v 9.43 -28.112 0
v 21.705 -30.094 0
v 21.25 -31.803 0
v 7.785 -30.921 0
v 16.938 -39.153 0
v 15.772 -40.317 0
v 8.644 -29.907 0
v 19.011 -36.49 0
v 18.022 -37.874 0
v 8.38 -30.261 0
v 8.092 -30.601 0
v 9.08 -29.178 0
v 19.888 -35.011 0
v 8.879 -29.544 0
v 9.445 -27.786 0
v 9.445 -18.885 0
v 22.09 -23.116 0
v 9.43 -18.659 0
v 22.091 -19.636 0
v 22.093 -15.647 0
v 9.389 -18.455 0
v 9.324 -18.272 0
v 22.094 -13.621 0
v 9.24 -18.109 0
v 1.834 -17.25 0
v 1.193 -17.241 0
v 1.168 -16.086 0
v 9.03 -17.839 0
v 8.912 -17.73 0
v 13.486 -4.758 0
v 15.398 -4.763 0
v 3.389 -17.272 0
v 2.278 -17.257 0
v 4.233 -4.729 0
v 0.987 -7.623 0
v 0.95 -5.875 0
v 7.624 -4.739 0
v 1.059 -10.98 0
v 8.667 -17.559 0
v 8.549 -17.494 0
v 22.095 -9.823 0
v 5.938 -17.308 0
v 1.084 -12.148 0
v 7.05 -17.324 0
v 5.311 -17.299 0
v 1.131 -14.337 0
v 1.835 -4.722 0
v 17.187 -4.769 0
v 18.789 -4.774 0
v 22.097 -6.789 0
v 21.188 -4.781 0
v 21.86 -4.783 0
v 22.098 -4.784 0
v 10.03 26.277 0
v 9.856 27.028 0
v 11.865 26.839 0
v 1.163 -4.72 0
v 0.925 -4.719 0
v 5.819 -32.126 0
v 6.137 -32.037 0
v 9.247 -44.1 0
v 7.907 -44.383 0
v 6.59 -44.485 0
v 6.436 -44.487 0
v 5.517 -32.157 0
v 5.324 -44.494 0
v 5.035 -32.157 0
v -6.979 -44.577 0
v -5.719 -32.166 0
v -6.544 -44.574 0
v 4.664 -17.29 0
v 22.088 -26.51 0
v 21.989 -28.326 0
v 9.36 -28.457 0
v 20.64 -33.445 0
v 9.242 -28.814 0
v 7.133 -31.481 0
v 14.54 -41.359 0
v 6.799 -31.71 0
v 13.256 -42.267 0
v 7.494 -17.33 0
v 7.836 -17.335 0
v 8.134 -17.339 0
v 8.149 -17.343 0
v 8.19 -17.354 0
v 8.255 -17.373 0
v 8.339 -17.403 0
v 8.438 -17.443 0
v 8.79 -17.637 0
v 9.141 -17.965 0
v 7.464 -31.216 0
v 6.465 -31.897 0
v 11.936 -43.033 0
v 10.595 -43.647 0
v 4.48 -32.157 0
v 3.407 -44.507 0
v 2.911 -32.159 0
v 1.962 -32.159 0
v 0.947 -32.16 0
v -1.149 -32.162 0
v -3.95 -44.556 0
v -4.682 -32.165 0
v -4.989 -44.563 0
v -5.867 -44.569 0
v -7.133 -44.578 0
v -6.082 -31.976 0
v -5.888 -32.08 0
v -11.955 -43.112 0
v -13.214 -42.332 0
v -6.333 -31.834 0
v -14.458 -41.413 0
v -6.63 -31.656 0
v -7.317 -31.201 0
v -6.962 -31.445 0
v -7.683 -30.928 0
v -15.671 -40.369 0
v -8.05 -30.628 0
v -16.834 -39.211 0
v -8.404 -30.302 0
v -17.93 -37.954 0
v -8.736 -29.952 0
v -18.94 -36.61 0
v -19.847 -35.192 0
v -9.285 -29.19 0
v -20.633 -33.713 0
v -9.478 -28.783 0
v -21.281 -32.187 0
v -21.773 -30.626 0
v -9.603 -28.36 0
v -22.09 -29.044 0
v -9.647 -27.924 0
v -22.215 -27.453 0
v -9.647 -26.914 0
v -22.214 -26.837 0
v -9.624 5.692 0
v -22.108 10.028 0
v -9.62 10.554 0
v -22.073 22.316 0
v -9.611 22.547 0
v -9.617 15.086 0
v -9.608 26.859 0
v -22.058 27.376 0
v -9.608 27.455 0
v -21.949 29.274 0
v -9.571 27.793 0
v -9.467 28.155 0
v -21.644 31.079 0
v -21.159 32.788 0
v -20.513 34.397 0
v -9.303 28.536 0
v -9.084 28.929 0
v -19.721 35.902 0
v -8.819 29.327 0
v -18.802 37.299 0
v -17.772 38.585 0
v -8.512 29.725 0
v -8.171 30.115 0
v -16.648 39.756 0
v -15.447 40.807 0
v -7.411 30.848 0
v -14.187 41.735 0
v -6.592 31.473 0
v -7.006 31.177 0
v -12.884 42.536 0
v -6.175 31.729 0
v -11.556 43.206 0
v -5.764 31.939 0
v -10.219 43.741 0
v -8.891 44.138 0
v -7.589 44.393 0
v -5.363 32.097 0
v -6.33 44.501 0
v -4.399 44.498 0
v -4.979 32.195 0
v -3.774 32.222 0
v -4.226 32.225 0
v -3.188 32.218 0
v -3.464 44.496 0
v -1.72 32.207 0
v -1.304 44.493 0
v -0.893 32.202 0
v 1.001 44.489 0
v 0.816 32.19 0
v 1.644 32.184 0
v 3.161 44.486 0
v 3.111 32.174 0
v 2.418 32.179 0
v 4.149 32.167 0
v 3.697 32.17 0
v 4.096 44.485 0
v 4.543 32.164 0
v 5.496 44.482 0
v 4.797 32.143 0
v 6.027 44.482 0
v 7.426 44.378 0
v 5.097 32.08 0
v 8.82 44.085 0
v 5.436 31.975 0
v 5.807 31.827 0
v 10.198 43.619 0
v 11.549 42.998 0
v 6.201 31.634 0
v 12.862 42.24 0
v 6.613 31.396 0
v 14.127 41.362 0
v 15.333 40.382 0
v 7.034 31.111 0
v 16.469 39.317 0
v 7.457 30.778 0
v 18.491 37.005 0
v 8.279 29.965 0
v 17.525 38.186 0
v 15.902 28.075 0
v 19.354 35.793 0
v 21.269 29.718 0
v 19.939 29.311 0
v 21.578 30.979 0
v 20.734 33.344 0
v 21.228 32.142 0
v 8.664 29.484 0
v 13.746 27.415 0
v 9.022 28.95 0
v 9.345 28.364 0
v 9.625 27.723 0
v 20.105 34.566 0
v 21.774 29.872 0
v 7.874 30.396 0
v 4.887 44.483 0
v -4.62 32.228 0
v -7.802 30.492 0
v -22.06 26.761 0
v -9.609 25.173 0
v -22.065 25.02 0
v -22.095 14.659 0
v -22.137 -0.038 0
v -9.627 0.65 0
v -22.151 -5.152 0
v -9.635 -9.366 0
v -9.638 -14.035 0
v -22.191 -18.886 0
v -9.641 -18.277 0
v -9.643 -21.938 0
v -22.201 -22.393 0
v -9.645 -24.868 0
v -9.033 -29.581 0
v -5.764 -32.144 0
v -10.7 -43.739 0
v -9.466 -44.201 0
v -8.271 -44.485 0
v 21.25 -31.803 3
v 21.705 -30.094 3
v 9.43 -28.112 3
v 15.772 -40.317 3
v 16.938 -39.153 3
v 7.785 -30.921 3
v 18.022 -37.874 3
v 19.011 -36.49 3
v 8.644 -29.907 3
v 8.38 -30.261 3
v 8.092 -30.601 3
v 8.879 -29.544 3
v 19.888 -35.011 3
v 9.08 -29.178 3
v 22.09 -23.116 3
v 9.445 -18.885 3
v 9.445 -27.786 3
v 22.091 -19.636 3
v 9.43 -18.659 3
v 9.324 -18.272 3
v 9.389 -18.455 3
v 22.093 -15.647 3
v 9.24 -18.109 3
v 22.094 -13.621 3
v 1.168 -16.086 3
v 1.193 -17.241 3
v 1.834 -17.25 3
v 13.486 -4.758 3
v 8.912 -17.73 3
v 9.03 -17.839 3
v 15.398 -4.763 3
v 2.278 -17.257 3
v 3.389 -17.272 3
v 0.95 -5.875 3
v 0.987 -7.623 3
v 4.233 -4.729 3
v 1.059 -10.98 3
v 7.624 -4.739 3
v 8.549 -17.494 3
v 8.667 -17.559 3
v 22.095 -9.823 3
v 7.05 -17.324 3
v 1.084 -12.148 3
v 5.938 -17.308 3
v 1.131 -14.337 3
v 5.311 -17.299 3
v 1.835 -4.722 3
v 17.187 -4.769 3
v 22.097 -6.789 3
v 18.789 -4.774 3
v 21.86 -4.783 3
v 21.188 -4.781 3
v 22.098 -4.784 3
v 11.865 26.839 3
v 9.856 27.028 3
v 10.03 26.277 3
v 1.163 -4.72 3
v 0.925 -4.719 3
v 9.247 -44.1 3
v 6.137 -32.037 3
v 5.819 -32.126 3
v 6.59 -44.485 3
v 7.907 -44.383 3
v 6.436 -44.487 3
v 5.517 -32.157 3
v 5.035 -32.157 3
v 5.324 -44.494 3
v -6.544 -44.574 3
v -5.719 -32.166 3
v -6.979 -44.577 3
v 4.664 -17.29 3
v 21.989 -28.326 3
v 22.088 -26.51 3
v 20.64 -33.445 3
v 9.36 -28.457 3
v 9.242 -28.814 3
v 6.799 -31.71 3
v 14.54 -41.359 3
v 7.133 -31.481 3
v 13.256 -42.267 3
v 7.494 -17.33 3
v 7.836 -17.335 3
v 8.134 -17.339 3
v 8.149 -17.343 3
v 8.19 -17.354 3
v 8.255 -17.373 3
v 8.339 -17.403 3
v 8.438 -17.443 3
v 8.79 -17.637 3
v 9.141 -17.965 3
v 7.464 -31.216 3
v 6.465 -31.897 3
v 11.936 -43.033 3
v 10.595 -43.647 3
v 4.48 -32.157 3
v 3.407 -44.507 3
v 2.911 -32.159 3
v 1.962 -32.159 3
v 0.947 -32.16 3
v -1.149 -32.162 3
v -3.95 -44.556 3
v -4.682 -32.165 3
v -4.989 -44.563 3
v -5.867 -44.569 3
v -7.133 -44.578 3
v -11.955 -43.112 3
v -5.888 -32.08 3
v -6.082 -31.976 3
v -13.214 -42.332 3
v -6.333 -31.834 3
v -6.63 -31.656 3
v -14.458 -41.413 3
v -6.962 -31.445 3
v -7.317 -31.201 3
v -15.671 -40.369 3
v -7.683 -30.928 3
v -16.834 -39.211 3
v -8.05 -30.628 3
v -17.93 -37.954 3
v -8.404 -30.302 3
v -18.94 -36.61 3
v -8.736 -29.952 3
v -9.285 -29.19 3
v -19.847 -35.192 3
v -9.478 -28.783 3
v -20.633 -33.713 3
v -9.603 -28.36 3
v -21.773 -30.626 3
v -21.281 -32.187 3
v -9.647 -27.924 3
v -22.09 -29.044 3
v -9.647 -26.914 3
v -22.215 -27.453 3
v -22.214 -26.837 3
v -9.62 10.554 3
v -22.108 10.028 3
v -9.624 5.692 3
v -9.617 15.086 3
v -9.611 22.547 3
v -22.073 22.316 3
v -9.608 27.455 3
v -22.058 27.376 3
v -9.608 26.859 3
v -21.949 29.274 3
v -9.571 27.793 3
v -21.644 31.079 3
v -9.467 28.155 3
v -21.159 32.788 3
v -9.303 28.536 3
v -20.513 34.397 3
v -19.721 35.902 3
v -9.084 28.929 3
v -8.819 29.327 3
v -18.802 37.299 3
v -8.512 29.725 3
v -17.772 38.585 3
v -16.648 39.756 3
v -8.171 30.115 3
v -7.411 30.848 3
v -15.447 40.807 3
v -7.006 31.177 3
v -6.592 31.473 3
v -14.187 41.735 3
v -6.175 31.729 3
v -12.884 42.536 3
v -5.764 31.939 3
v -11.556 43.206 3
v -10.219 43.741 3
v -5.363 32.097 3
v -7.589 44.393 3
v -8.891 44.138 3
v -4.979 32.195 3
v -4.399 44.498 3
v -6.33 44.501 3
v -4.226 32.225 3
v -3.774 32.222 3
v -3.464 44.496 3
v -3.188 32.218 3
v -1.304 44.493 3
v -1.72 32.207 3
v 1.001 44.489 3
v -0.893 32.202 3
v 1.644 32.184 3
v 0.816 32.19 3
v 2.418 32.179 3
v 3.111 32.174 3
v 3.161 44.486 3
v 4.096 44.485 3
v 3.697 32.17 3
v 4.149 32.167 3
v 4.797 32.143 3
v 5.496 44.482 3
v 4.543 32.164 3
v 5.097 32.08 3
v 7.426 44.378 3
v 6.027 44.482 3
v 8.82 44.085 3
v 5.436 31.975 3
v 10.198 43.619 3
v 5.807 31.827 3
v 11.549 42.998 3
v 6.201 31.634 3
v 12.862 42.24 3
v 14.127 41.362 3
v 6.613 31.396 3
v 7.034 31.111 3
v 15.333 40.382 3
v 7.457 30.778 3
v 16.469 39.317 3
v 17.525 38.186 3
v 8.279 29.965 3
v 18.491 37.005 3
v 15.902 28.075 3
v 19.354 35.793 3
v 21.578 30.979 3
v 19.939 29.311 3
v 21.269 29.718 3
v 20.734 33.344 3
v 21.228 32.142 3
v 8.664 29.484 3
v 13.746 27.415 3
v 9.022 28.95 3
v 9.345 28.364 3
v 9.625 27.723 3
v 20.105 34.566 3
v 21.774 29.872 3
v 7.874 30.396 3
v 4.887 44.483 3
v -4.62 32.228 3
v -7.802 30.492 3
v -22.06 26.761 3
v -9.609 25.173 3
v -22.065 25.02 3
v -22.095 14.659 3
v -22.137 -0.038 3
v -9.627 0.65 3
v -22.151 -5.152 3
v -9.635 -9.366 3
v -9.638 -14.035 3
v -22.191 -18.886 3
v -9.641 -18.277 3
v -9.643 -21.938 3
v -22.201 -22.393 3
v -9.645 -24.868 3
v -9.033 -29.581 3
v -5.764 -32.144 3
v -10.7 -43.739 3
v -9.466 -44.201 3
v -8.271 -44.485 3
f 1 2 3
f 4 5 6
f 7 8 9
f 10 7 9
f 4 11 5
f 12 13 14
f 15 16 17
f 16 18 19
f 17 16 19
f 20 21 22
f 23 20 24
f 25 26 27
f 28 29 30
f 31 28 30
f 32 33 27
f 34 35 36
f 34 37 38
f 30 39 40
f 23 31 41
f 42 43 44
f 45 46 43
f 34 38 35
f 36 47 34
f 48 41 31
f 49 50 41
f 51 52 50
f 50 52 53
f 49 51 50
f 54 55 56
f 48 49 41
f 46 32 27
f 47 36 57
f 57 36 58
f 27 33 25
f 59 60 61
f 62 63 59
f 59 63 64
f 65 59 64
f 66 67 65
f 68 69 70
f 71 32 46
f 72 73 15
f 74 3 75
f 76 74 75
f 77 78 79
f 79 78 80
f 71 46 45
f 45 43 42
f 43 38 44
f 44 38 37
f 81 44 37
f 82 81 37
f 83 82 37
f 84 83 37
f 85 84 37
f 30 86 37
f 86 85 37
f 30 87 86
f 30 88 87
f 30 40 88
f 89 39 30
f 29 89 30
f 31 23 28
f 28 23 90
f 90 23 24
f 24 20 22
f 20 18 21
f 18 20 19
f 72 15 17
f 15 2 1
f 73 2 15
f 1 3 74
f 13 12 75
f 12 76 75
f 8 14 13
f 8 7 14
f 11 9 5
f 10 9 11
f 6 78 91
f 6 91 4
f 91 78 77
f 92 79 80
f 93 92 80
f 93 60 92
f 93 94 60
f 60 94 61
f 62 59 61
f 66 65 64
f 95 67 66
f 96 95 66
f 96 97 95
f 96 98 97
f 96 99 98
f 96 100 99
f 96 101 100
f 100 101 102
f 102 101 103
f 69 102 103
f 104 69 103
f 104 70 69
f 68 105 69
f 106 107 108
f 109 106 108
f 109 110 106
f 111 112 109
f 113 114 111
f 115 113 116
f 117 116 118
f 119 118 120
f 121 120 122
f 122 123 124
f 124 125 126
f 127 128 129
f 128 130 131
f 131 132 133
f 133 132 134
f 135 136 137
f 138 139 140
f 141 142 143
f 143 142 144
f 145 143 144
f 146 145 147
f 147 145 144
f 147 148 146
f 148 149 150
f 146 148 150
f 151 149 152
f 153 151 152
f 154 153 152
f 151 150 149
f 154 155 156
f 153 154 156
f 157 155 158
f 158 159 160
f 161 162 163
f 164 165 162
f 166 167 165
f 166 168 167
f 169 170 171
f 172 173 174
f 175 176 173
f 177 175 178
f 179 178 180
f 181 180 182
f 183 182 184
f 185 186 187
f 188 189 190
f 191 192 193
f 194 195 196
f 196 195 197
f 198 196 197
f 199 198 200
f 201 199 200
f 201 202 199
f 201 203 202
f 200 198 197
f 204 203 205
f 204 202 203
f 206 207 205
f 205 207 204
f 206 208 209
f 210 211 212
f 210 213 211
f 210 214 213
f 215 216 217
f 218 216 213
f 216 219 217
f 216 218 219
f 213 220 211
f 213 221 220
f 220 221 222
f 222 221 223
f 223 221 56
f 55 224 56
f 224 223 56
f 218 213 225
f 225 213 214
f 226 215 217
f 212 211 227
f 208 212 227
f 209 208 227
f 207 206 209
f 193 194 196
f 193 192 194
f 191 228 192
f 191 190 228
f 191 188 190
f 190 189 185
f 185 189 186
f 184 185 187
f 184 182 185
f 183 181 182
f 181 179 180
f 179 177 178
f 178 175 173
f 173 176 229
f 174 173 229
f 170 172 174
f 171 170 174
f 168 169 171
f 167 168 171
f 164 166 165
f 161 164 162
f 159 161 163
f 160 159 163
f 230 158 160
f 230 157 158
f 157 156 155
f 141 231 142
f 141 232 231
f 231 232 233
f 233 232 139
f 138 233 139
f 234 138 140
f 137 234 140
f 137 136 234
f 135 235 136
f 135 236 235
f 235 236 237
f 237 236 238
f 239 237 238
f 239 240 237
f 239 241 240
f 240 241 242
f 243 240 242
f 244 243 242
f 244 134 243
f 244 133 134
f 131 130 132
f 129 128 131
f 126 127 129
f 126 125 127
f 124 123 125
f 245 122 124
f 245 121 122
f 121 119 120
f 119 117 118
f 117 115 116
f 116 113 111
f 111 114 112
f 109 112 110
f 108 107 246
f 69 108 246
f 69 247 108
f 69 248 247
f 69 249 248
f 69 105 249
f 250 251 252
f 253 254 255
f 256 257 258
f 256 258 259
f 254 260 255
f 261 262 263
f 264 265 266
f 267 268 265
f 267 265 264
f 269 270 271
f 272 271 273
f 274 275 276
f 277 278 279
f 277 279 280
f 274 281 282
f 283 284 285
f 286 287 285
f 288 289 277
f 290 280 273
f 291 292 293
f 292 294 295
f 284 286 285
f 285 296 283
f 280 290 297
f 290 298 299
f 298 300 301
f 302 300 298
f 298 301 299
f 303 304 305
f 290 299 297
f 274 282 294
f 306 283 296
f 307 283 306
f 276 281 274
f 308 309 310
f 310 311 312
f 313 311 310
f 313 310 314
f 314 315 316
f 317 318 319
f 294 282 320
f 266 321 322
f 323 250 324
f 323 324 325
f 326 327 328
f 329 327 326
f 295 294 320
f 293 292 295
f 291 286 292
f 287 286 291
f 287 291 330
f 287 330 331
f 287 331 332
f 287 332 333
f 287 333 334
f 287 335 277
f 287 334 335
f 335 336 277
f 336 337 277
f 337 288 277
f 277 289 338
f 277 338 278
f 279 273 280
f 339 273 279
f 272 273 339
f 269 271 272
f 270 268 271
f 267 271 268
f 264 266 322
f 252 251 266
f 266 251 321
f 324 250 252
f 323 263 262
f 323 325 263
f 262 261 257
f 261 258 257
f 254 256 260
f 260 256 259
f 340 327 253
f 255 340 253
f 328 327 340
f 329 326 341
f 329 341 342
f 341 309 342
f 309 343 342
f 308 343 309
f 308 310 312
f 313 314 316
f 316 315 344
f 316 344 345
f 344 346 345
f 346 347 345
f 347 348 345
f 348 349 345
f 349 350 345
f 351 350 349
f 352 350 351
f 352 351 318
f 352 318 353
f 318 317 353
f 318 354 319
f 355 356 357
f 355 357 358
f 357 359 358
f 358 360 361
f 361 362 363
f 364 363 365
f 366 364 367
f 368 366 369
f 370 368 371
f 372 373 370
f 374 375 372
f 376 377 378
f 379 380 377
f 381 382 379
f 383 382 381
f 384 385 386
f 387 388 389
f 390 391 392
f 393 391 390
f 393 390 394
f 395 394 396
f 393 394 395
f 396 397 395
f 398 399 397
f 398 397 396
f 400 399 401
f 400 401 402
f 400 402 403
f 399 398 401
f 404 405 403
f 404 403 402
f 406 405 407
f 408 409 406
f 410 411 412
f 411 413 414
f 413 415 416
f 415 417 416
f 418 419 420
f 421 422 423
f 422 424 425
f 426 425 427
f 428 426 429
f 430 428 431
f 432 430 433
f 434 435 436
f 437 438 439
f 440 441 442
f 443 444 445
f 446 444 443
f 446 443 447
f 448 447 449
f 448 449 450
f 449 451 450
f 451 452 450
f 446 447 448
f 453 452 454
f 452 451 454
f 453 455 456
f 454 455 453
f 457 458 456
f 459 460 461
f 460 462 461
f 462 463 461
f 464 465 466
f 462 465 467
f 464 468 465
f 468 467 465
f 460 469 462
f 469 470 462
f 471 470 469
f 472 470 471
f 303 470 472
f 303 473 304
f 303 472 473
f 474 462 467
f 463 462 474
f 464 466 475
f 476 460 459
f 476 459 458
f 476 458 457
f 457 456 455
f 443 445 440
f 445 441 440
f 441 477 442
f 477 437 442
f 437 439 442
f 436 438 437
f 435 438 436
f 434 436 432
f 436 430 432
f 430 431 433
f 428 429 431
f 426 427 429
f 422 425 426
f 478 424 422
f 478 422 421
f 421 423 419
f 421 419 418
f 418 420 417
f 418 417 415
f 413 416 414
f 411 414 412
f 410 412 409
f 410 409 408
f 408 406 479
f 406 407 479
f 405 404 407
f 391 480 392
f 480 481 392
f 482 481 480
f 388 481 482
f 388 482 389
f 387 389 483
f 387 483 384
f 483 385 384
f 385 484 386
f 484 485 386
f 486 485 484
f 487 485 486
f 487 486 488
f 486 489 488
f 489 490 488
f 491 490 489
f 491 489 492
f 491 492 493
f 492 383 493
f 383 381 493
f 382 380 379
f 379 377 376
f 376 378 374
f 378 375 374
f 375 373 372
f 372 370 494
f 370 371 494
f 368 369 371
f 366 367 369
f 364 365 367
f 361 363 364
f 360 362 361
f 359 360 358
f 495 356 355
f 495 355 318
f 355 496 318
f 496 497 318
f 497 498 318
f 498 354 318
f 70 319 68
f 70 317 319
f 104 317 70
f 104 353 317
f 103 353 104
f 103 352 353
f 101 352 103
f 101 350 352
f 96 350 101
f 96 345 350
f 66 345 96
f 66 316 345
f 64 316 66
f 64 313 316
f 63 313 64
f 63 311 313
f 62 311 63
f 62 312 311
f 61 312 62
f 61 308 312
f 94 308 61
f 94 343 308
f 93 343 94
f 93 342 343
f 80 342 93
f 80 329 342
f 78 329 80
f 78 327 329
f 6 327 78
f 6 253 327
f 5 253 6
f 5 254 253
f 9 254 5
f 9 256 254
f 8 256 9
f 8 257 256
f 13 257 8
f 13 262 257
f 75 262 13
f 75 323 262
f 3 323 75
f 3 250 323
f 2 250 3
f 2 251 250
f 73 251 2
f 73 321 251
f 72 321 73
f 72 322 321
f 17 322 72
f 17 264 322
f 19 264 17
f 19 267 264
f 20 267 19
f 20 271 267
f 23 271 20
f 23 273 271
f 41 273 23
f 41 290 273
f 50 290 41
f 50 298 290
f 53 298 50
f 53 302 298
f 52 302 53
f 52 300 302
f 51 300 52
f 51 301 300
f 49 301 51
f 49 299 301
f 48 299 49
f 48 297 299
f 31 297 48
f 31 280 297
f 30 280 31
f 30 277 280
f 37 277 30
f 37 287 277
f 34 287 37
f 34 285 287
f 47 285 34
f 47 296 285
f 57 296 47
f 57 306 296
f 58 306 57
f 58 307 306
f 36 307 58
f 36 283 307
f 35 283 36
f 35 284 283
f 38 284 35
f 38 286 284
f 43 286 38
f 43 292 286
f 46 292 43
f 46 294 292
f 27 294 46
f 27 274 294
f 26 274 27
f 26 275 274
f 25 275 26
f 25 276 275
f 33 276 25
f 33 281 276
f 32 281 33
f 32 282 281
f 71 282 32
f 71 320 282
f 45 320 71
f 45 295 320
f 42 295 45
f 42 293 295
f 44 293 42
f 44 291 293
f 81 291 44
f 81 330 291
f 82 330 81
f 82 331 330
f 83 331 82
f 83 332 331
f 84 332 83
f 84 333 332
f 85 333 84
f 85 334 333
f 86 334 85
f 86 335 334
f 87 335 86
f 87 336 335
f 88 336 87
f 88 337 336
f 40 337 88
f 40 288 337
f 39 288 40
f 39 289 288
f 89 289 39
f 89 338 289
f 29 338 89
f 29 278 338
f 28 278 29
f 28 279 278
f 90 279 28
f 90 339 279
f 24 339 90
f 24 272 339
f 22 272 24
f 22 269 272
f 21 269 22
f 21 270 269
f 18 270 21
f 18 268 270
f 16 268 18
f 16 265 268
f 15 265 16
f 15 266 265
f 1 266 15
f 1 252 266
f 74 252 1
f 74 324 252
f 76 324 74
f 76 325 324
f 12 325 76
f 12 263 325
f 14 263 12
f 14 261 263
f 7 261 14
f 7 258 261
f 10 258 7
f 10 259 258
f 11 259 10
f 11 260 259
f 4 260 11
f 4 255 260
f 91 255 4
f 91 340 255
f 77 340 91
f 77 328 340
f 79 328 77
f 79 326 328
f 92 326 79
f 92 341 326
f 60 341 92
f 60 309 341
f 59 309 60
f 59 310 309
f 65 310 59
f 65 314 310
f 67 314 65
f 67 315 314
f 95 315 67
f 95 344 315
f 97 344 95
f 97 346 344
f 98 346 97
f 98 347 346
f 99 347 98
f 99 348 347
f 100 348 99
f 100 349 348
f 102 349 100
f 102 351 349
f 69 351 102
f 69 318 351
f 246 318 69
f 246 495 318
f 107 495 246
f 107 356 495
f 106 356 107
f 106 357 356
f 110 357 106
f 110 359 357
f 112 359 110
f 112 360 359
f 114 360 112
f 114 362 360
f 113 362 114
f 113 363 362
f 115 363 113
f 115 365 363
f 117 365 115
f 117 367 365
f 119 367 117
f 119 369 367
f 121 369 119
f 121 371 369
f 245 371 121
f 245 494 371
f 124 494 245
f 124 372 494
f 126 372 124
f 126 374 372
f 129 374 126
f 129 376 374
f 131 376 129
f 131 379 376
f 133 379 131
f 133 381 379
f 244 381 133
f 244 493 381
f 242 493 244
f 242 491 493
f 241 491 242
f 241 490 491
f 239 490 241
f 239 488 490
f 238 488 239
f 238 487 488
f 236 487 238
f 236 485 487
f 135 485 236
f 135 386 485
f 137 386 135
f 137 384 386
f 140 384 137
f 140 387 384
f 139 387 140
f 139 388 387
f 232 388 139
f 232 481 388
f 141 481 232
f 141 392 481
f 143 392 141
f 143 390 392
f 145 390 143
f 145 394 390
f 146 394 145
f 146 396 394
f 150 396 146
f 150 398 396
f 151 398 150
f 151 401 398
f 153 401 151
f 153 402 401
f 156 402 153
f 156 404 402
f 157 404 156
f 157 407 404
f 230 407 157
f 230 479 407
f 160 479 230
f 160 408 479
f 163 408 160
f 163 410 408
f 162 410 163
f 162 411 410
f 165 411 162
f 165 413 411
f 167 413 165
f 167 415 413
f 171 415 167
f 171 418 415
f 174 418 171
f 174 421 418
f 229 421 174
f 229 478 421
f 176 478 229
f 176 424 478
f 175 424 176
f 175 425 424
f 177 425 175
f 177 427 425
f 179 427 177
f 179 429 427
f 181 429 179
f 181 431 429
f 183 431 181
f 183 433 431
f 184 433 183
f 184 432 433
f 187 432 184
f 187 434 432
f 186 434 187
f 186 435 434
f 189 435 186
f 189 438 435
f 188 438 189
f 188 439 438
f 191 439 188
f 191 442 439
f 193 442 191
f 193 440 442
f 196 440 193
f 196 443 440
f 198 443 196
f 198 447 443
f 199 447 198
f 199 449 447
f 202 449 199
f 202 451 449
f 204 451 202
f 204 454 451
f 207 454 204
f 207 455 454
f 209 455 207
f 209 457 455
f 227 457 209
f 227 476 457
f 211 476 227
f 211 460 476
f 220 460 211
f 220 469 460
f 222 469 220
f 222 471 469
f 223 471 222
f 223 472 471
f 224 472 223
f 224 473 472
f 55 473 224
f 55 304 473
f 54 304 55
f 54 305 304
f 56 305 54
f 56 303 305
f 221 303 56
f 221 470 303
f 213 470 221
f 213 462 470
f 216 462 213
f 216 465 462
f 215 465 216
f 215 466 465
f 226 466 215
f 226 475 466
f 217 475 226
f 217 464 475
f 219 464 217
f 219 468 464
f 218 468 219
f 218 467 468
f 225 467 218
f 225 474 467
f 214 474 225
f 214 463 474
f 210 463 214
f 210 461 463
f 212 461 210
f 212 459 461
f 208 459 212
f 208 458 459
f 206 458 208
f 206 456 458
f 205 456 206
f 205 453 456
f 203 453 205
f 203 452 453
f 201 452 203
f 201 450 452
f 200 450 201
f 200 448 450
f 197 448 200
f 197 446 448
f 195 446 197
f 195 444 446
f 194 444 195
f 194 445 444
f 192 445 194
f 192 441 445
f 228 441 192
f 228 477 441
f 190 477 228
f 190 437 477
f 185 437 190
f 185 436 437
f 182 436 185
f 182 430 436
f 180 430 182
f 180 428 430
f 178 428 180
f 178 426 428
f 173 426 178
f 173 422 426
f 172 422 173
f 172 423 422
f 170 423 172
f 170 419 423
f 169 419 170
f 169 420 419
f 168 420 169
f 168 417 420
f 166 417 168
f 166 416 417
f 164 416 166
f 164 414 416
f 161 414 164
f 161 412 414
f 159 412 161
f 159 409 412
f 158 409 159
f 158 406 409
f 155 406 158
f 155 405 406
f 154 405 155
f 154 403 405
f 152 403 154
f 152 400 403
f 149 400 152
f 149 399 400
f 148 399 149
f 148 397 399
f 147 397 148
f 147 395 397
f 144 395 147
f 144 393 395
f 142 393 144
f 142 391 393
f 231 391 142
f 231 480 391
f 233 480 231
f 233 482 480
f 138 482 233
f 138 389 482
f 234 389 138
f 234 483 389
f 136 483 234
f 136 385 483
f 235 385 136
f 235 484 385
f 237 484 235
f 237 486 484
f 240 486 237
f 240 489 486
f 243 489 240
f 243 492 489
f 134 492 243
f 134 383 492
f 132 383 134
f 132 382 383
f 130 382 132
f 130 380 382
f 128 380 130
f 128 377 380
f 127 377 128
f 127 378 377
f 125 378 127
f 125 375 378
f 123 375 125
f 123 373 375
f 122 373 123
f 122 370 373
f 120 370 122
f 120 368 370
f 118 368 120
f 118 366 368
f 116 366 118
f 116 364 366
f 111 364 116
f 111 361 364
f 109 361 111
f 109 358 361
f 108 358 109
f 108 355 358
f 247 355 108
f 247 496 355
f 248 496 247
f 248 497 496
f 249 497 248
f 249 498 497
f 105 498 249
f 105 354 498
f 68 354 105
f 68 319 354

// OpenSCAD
// Generated from 交通部公路局（原交通部公路總局）「新式號牌使用之英文字、數字字體」author trace
fudge = 0.1;

module glyph_2012_G(h = 3) {
  difference() {
    linear_extrude(height = h)
      polygon(points = [[-6.3296, 44.5007], [-7.5892, 44.3927], [-8.8915, 44.1383], [-10.2195, 43.7415], [-11.5561, 43.206], [-12.8844, 42.5359], [-14.1871, 41.7349], [-15.4473, 40.8068], [-16.6478, 39.7557], [-17.7717, 38.5852], [-18.8018, 37.2993], [-19.7211, 35.9019], [-20.5126, 34.3967], [-21.1591, 32.7878], [-21.6436, 31.0788], [-21.949, 29.2737], [-22.0583, 27.3763], [-22.0601, 26.7606], [-22.0651, 25.0204], [-22.0728, 22.3164], [-22.0829, 18.8092], [-22.0948, 14.6595], [-22.108, 10.0279], [-22.1222, 5.0751], [-22.1369, -0.0384], [-22.1515, -5.1519], [-22.1657, -10.1048], [-22.179, -14.7364], [-22.1909, -18.8861], [-22.2009, -22.3933], [-22.2087, -25.0973], [-22.2137, -26.8374], [-22.2154, -27.4532], [-22.09, -29.044], [-21.7726, -30.6263], [-21.2812, -32.1871], [-20.6334, -33.7134], [-19.847, -35.192], [-18.9398, -36.61], [-17.9296, -37.9541], [-16.8341, -39.2115], [-15.6712, -40.369], [-14.4585, -41.4135], [-13.2139, -42.3321], [-11.955, -43.1116], [-10.6998, -43.7389], [-9.466, -44.2011], [-8.2712, -44.485], [-7.1334, -44.5776], [-6.9793, -44.5766], [-6.5437, -44.5737], [-5.8669, -44.5691], [-4.9891, -44.5632], [-3.9504, -44.5563], [-2.7911, -44.5485], [-1.5514, -44.5402], [-0.2716, -44.5316], [1.0083, -44.523], [2.248, -44.5147], [3.4073, -44.5069], [4.446, -44.4999], [5.3238, -44.494], [6.0006, -44.4895], [6.4362, -44.4866], [6.5903, -44.4855], [7.9069, -44.3827], [9.2467, -44.1001], [10.5948, -43.647], [11.9362, -43.0329], [13.2562, -42.267], [14.5397, -41.3587], [15.7718, -40.3175], [16.9376, -39.1528], [18.0222, -37.8738], [19.0108, -36.4899], [19.8882, -35.0107], [20.6398, -33.4453], [21.2504, -31.8032], [21.7053, -30.0938], [21.9895, -28.3264], [22.0881, -26.5105], [22.0882, -26.2665], [22.0885, -25.577], [22.089, -24.5055], [22.0896, -23.1157], [22.0903, -21.4714], [22.0911, -19.6361], [22.092, -17.6735], [22.0929, -15.6473], [22.0937, -13.621], [22.0946, -11.6584], [22.0954, -9.8231], [22.0961, -8.1788], [22.0967, -6.7891], [22.0972, -5.7176], [22.0975, -5.028], [22.0976, -4.784], [21.8598, -4.7833], [21.1878, -4.7812], [20.1437, -4.778], [18.7894, -4.7739], [17.187, -4.7689], [15.3984, -4.7634], [13.4859, -4.7576], [11.5113, -4.7515], [9.5367, -4.7454], [7.6241, -4.7395], [5.8356, -4.734], [4.2332, -4.7291], [2.8789, -4.7249], [1.8347, -4.7217], [1.1627, -4.7197], [0.925, -4.7189], [0.928, -4.8596], [0.9365, -5.257], [0.9497, -5.8746], [0.9669, -6.6755], [0.9872, -7.6233], [1.0098, -8.6811], [1.034, -9.8122], [1.059, -10.9801], [1.0841, -12.148], [1.1083, -13.2791], [1.1309, -14.3369], [1.1512, -15.2847], [1.1684, -16.0857], [1.1816, -16.7032], [1.1901, -17.1006], [1.1931, -17.2413], [1.2711, -17.2424], [1.4914, -17.2455], [1.8337, -17.2503], [2.2777, -17.2566], [2.803, -17.264], [3.3893, -17.2723], [4.0163, -17.2811], [4.6637, -17.2902], [5.311, -17.2994], [5.938, -17.3082], [6.5243, -17.3165], [7.0496, -17.3239], [7.4936, -17.3301], [7.8359, -17.335], [8.0562, -17.3381], [8.1342, -17.3392], [8.1489, -17.3426], [8.1905, -17.3537], [8.2551, -17.3733], [8.339, -17.4026], [8.4382, -17.4427], [8.5489, -17.4944], [8.6674, -17.5589], [8.7896, -17.6373], [8.9119, -17.7304], [9.0303, -17.8395], [9.141, -17.9654], [9.2403, -18.1094], [9.3241, -18.2723], [9.3888, -18.4552], [9.4304, -18.6592], [9.4451, -18.8853], [9.4451, -18.9853], [9.4451, -19.2678], [9.4451, -19.7067], [9.4451, -20.2761], [9.4451, -20.9497], [9.4451, -21.7016], [9.4451, -22.5057], [9.4451, -23.3358], [9.4451, -24.1659], [9.4451, -24.97], [9.4451, -25.7219], [9.4451, -26.3956], [9.4451, -26.9649], [9.4451, -27.4039], [9.4451, -27.6864], [9.4451, -27.7863], [9.4297, -28.1124], [9.3604, -28.4567], [9.2422, -28.8137], [9.0802, -29.1781], [8.8792, -29.5445], [8.6442, -29.9075], [8.3802, -30.2615], [8.0921, -30.6013], [7.785, -30.9215], [7.4637, -31.2165], [7.1333, -31.481], [6.7986, -31.7096], [6.4648, -31.8969], [6.1367, -32.0375], [5.8192, -32.1259], [5.5175, -32.1567], [5.3913, -32.1568], [5.0346, -32.1571], [4.4805, -32.1575], [3.7617, -32.1581], [2.9112, -32.1588], [1.962, -32.1595], [0.947, -32.1604], [-0.101, -32.1612], [-1.149, -32.162], [-2.164, -32.1628], [-3.1132, -32.1636], [-3.9637, -32.1643], [-4.6825, -32.1649], [-5.2366, -32.1653], [-5.5933, -32.1656], [-5.7195, -32.1657], [-5.7636, -32.1439], [-5.8882, -32.0801], [-6.0819, -31.9762], [-6.3332, -31.8343], [-6.6304, -31.6565], [-6.9622, -31.4449], [-7.317, -31.2015], [-7.6833, -30.9285], [-8.0496, -30.6278], [-8.4044, -30.3016], [-8.7361, -29.9519], [-9.0334, -29.5808], [-9.2846, -29.1904], [-9.4783, -28.7827], [-9.603, -28.3599], [-9.6471, -27.9239], [-9.6466, -26.9136], [-9.6454, -24.8677], [-9.6435, -21.9381], [-9.6409, -18.2766], [-9.638, -14.0353], [-9.6347, -9.3659], [-9.6311, -4.4203], [-9.6274, 0.6496], [-9.6238, 5.6918], [-9.6202, 10.5545], [-9.6169, 15.0859], [-9.6139, 19.1339], [-9.6114, 22.5468], [-9.6095, 25.1726], [-9.6082, 26.8595], [-9.6078, 27.4555], [-9.5709, 27.7929], [-9.467, 28.1552], [-9.3027, 28.5361], [-9.0845, 28.929], [-8.8189, 29.3275], [-8.5122, 29.7251], [-8.1711, 30.1153], [-7.802, 30.4917], [-7.4114, 30.8478], [-7.0057, 31.1771], [-6.5916, 31.4731], [-6.1753, 31.7294], [-5.7636, 31.9394], [-5.3627, 32.0968], [-4.9793, 32.195], [-4.6197, 32.2276], [-4.5168, 32.2269], [-4.226, 32.2249], [-3.7741, 32.2217], [-3.188, 32.2177], [-2.4946, 32.2129], [-1.7205, 32.2075], [-0.8928, 32.2017], [-0.0383, 32.1958], [0.8162, 32.1899], [1.6439, 32.1841], [2.418, 32.1788], [3.1114, 32.1739], [3.6975, 32.1699], [4.1494, 32.1667], [4.4402, 32.1647], [4.5431, 32.164], [4.797, 32.1429], [5.0971, 32.0804], [5.4361, 31.9755], [5.8067, 31.827], [6.2014, 31.6341], [6.6129, 31.3956], [7.0338, 31.1106], [7.4568, 30.7779], [7.8745, 30.3965], [8.2795, 29.9655], [8.6644, 29.4837], [9.0219, 28.9501], [9.3446, 28.3637], [9.6252, 27.7235], [9.8562, 27.0284], [10.0303, 26.2773], [10.1622, 26.3177], [10.5349, 26.4318], [11.114, 26.6091], [11.8652, 26.8391], [12.754, 27.1112], [13.746, 27.4149], [14.8068, 27.7396], [15.9021, 28.0749], [16.9973, 28.4102], [18.0581, 28.735], [19.0501, 29.0387], [19.9389, 29.3108], [20.6901, 29.5407], [21.2693, 29.718], [21.642, 29.8321], [21.7739, 29.8725], [21.5785, 30.979], [21.2282, 32.1419], [20.7336, 33.3436], [20.1053, 34.5664], [19.3541, 35.7928], [18.4906, 37.0052], [17.5255, 38.1859], [16.4694, 39.3174], [15.3331, 40.3819], [14.1271, 41.362], [12.8622, 42.24], [11.549, 42.9982], [10.1982, 43.6191], [8.8205, 44.085], [7.4265, 44.3784], [6.0269, 44.4816], [5.8881, 44.4818], [5.496, 44.4824], [4.8866, 44.4834], [4.0962, 44.4846], [3.161, 44.4861], [2.1172, 44.4877], [1.001, 44.4894], [-0.1513, 44.4912], [-1.3037, 44.493], [-2.4199, 44.4947], [-3.4637, 44.4963], [-4.3989, 44.4978], [-5.1893, 44.499], [-5.7987, 44.4999], [-6.1908, 44.5005]]);
  }
}

glyph_2012_G();
